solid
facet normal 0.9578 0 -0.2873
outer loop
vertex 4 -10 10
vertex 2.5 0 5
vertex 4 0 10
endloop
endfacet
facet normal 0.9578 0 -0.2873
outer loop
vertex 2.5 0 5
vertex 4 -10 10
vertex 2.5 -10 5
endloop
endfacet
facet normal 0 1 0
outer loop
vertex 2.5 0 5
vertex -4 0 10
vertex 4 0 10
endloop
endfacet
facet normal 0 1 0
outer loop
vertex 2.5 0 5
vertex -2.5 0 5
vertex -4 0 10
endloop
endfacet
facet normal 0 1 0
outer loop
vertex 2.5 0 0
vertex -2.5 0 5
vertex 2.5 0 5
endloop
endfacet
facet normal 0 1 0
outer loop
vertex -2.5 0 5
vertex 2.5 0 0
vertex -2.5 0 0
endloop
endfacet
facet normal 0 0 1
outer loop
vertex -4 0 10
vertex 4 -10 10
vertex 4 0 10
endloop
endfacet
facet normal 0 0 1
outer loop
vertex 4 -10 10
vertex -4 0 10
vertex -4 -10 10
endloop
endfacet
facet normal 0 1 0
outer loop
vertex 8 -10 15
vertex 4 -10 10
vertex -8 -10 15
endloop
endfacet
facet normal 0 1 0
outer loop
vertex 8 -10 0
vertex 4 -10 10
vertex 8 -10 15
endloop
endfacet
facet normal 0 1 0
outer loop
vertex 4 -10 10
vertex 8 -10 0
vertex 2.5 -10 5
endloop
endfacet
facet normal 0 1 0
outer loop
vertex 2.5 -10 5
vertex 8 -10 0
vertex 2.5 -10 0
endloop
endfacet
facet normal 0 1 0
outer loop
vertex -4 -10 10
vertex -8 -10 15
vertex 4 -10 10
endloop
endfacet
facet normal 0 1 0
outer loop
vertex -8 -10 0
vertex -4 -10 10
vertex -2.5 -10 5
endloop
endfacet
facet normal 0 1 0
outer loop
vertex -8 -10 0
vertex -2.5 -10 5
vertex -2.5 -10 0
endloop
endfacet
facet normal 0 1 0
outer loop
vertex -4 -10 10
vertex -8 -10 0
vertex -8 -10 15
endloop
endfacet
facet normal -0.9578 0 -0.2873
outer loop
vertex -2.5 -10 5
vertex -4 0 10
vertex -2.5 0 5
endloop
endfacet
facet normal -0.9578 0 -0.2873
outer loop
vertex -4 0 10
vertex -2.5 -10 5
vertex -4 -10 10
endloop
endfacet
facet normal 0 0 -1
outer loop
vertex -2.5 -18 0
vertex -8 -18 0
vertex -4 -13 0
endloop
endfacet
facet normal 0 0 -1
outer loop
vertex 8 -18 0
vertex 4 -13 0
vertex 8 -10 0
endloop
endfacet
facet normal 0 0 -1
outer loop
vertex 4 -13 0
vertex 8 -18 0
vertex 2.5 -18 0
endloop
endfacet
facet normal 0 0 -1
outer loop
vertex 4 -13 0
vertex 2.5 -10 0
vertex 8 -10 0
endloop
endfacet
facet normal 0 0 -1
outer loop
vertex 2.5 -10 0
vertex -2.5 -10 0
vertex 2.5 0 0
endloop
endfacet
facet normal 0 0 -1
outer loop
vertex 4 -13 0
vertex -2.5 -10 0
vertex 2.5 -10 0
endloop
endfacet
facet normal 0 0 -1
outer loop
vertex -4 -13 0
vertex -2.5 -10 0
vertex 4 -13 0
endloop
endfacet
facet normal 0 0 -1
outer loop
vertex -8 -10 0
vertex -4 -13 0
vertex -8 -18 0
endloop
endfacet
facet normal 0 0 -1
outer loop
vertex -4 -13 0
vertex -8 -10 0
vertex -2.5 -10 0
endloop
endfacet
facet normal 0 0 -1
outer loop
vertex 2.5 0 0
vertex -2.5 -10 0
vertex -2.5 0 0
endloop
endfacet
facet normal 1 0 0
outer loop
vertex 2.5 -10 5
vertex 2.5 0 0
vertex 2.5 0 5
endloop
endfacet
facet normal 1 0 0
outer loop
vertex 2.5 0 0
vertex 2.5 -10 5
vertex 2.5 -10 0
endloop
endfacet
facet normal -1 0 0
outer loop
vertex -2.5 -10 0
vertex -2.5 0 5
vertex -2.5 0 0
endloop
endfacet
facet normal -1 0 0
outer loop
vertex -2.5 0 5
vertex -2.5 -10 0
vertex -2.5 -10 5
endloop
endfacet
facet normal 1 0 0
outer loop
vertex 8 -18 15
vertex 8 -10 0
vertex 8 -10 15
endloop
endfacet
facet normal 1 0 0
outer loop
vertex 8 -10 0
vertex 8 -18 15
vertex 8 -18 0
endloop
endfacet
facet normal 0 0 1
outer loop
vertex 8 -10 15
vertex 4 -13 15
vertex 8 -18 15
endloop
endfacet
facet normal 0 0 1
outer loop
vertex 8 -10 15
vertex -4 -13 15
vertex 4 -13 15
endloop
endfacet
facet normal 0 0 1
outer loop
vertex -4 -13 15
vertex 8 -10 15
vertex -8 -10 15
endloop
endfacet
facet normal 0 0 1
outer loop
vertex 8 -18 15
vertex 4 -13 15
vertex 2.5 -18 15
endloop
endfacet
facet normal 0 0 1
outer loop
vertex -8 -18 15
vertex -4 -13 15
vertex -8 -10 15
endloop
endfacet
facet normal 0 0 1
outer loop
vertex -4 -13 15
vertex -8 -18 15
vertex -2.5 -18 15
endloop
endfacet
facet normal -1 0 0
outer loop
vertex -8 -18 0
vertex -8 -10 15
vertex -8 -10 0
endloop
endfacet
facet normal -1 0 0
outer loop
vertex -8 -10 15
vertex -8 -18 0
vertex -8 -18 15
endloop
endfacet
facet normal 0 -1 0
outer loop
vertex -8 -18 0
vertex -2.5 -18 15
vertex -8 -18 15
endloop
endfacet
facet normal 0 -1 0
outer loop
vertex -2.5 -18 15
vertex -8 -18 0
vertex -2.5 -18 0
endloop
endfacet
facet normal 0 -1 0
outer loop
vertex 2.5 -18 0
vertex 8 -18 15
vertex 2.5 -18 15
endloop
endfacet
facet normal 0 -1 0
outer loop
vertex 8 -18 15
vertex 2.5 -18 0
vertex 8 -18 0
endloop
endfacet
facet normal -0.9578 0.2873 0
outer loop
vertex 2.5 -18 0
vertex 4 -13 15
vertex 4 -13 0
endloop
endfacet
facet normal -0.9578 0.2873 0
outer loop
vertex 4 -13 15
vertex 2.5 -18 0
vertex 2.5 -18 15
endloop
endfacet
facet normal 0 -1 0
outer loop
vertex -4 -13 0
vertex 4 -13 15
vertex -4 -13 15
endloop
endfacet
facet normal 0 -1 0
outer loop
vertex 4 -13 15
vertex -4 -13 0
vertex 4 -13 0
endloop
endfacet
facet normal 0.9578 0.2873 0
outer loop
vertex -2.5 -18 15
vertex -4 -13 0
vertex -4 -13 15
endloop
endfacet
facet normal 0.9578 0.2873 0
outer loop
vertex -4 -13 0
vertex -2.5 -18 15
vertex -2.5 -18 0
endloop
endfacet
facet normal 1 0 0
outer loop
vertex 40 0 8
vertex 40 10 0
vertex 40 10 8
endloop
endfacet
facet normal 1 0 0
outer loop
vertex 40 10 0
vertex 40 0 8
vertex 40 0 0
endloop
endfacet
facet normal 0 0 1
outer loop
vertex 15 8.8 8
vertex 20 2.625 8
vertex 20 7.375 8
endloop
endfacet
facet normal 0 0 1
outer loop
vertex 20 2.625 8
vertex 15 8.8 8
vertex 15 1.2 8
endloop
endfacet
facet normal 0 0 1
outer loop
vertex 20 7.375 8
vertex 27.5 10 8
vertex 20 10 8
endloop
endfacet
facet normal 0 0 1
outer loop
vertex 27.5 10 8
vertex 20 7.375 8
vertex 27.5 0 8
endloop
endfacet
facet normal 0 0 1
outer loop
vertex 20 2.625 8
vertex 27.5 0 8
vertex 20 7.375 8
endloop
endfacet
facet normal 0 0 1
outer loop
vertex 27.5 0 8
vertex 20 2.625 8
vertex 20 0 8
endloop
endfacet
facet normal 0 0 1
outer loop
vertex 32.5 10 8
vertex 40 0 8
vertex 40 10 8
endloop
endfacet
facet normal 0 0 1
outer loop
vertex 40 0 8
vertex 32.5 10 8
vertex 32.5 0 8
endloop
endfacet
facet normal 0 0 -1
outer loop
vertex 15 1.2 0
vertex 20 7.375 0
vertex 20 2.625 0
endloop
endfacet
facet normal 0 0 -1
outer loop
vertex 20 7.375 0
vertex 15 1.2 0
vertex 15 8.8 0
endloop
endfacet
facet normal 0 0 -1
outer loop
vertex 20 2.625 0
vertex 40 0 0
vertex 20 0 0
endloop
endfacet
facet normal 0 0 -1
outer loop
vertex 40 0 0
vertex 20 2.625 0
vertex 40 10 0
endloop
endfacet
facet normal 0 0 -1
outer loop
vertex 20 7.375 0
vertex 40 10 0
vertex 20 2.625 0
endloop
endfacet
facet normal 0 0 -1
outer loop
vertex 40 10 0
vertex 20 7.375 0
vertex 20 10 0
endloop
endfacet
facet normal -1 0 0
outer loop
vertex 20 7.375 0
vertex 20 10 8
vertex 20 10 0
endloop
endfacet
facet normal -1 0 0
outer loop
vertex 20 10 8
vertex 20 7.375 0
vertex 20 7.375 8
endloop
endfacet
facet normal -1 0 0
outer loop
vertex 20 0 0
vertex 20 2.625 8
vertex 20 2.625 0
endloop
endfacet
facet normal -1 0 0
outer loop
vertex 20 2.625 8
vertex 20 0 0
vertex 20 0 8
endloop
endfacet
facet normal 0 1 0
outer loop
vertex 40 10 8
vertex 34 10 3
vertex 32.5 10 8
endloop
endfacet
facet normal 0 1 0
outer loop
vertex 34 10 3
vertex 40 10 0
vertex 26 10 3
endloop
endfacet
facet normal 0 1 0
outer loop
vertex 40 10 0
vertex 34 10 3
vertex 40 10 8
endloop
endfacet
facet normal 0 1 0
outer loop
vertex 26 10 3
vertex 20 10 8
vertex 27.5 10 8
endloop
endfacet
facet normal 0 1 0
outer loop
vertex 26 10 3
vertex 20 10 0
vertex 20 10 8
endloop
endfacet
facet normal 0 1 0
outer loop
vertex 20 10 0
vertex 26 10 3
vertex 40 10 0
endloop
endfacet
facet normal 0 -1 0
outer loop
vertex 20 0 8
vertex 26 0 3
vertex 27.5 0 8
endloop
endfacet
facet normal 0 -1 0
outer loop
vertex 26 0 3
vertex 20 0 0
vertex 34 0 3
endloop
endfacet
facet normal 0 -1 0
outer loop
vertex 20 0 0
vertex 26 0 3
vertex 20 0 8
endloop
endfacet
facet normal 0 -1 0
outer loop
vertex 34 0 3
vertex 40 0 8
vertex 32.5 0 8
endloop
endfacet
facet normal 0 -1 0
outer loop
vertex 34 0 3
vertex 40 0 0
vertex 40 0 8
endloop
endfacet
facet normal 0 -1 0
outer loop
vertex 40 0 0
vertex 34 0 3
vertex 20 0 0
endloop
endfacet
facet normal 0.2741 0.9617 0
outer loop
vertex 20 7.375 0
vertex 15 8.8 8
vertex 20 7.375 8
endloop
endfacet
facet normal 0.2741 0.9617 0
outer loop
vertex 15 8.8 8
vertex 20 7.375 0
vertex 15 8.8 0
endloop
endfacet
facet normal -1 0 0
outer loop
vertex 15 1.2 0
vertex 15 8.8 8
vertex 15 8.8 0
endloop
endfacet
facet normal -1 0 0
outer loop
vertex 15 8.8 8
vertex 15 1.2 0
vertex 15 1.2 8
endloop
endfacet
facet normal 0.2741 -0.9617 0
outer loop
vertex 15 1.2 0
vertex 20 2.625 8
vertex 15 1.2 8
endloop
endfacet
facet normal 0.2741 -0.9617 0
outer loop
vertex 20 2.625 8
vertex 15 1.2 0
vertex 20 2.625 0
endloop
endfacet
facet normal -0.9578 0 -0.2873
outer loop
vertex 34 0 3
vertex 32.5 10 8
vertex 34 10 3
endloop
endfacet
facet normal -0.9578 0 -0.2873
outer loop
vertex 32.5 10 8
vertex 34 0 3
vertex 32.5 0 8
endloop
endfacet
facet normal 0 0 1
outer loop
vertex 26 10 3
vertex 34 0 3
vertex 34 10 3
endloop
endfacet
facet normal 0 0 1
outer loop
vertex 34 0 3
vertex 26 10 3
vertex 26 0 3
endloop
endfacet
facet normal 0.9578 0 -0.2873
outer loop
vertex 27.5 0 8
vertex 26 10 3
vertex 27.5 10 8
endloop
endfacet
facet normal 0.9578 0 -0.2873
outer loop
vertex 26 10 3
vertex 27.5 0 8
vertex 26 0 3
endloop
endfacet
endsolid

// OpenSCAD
// file: include.scad
include <globals.scad>;

//////////////////      END SECTION       //////////////////

	module added_pins(){
		difference(){
			union(){
				translate([30/(15/4),obj_leg*leg_length,30/(15/4)]) pin();
				translate([30/(15/4)+14.5,obj_leg*leg_length,30/(15/4)+14]) pin();
			}
			union(){
							translate([30/(15/4)+13.5,obj_leg*leg_length-20,30/(15/4)+5])cube(size=[2,40,15]);
							translate([30/(15/4)+7.5,obj_leg*leg_length-20,30/(15/4)+15])rotate([0,90,0]) cube(size=[2,40,15]);	

							translate([30/(15/4)-1,obj_leg*leg_length-20,30/(15/4)-8])cube(size=[2,40,15]);
							translate([30/(15/4)-10,obj_leg*leg_length-20,30/(15/4)+1])rotate([0,90,0]) cube(size=[2,40,15]);
			}
		}
	}
	module taken_pins() {
		translate([30/(15/4)+14,obj_leg*leg_length-10,30/(15/4)]) mirror_pin();
		translate([30/(15/4),obj_leg*leg_length-10,30/(15/4)+15]) mirror_pin();
	}


//////////////////      OTHER STUFF       //////////////////

	module holes() {
		rotate([0,0,90]) for(y=[0:other_holes])
		translate([obj_leg+y*15,-15.5,7.5]) union() {
			translate([7.5,0,15]) hole_up();
			hole_down();
		}
	}
	module extend_holes() {
	module top(){
		rotate([0,0,90]) for(y=[0:other_holes+1])
		translate([(30/4)+y*15,-15.5,7.5]) union() {
			translate([7.5,0,15]) hole_up();
		}
	}
	module bottom(){
		rotate([0,0,90]) for(y=[0:other_holes+2])
		translate([(30/4)+y*15,-15.5,7.5]) union() {
			hole_down();
		
}
	}
	union(){
		top();
		bottom();
	}
	}

	module hole() {
		union() {
			rotate([90, 90, 0]) cylinder(h=40, d=hole_pin_diameter, center=true);
			translate([0,7.5,0]) sphere(d=hole_ball_size);
			translate([0,-6,0]) sphere(d=hole_ball_size);
		}
	}
	module hole_up() {
		union() {
			rotate([90, 90, 0]) cylinder(h=40, d=hole_pin_diameter, center=true);
			translate([0,7.5,10]) cylinder(h=hole_pin_height, d=hole_pin_diameter, center=true);
			translate([0,-6,10]) cylinder(h=hole_pin_height, d=hole_pin_diameter, center=true);
			translate([0,7.5,0]) sphere(d=hole_ball_size);
			translate([0,-6,0]) sphere(d=hole_ball_size);
		}
	}
	module hole_down() {
		union() {
			rotate([90, 90, 0]) cylinder(h=40, d=hole_pin_diameter, center=true);
			translate([0,7.5,-10]) cylinder(h=hole_pin_height, d=hole_pin_diameter, center=true);
			translate([0,-6,-10]) cylinder(h=hole_pin_height, d=hole_pin_diameter, center=true);
			translate([0,7.5,0]) sphere(d=hole_ball_size);
			translate([0,-6,0]) sphere(d=hole_ball_size);
		}
	}
	module pin() {
		union() {
			rotate([90, 90, 0]) cylinder(h=pin_height, d=pin_diameter, center=true);
			translate([0,7.5,0]) sphere(d=ball_size);
		}
	}

	module mirror_pin() {
		rotate([90, 90, 0]) cylinder(h=hole_pin_height+small_number, d=hole_pin_diameter, center=true);
		translate([0,-(pin_height-(ball_size/2)),0]) sphere(d=ball_size);
	}


//////////////////      SOME RACK AND Z THINGS       //////////////////

module z_holes() {
    rotate([0,-90,0]) for(z=[0:z_hole_number])
    translate([22.5+z*15,16,-12])
        hole();
}

module pin_cuts() {
	union(){
		cube(size=[2,10,40], center=true);
		rotate([0,0,90]) cube(size=[2,10,40], center=true);
	}
}
module pin_uncut() {
	union(){
		rotate([0, 0, 90]) cylinder(h=hole_pin_height, d=hole_pin_diameter, center=true);
		translate([0,0,10]) sphere(d=ball_hole);
	}
}


module pin_out() {
	union(){
		rotate([0, 0, 90]) cylinder(h=pin_height, d=pin_diameter, center=true);
		translate([0,0,10]) sphere(d= ball_size);
	}
}


module pins_z(){
	difference() {
		pin_out();
		pin_cuts();
	}
}
//////////////////      RACK AND SLIDE     ///////////////////

module straight_pins() {
	for(z=[0:((((obj_leg*leg_length)*2)-(obj_leg*2))/3)/14.5]) rotate([-90,0,0]) translate([z*15,30/(15/4),14]) pins_z();
	for(z=[0:((((obj_leg*leg_length)*2)-(obj_leg*2))/3)/14.5]) rotate([-90,0,0]) translate([z*15,30/(15/4)-14,14]) pins_z();
}
module stagger_pins() {
	for(z=[0:((((obj_leg*leg_length)*2)-(obj_leg*2))/3)/14.5]) rotate([-90,0,0]) translate([z*15,30/(15/4),14]) pins_z();
	for(z=[0:((((obj_leg*leg_length)*2)-(obj_leg*2))/3)/14.5]) rotate([-90,0,0]) translate([z*15+7,30/(15/4)-14,14]) pins_z();
}


//////////////////      DOVE TAIL       //////////////////

module male_dovetail(height) {
	dovetail_3d(max_width,min_width,depth,height);
}

module dovetail_3d(max_width=11, min_width=5, depth=5, height=30) {
	linear_extrude(height=height, convexity=2)
		dovetail_2d(max_width,min_width,depth);
}

module dovetail_2d(max_width=11, min_width=5, depth=5) {
	angle=atan((max_width/2-min_width/2)/depth);
	//echo("angle: ", angle);
	polygon(paths=[[0,1,2,3,0]], points=[[-min_width/2,0], [-max_width/2,depth], [max_width/2, depth], [min_width/2,0]]);
}

//bow tie
	module tie_end(height){
				rotate([0,0,0]) translate([0,-0.01,((obj_leg/2)/2)]) male_dovetail(height);
				rotate([0,90,0]) translate([0,-0.01,((obj_leg/2)/2)]) male_dovetail(height);
				rotate([0,180,0]) translate([0,-0.01,((obj_leg/2)/2)]) male_dovetail(height);
				rotate([0,-90,0]) translate([0,-0.01,((obj_leg/2)/2)]) male_dovetail(height);
	}

module bow_support(){
	difference(){
		intersection(){
			translate([-15,0,-15]) cube([30,9,30]);
			scale([1.05,1.05,1.05]) rotate([0,45,0]) tie_end();
		}
		cube([29.2,29.2,29.2], center=true);
	}
}

	module wrap(units){
	for (y = [-1:units-2]) // two iterations, z = -1, z = 1
	{
			translate([15, (y*30)+15, 15]){
			for (r = [0:4]) // two iterations, z = -1, z = 1
			{
				rotate([0,r*90,0]) translate([0,15,15]) rotate([-90,0,0])male_dovetail(height=30);
			}
		}
	}
	}


module nut(h=2.4) {
    hull() {
        cylinder(d = 6.5, h=h, $fn=6);
        translate([0,0,2.4]) cylinder(d = 3.2, h=1.2, $fn=20);
    }
}

module elongated_nut() {
    hull() {
        translate([-2,0,0]) nut();
        translate([2,0,0]) nut();
    }
}

module motor_shaft_hole(h=10) {
    difference() {
        cylinder(d=motor_shaft_hole_dia, h=h);
        translate([0,4.5,h/2]) cube([5,5,h], center=true); 
    }
}

module motor_plate(h=5) {
    difference () {
        translate([0,0,h/2]) cube([motor_side_length,motor_side_length,h], center=true);
            
        translate([0,0,-.5]) cylinder(d=motor_center_hole, h=h+1);

        translate([motor_bolt_hole_distance/2,motor_bolt_hole_distance/2,0]) cylinder(d=bolt_hole_dia, h=h+1, $fn=20);
        translate([-motor_bolt_hole_distance/2,motor_bolt_hole_distance/2,0]) cylinder(d=bolt_hole_dia, h=h+1, $fn=20);
        translate([motor_bolt_hole_distance/2,-motor_bolt_hole_distance/2,0]) cylinder(d=bolt_hole_dia, h=h+1, $fn=20);
        translate([-motor_bolt_hole_distance/2,-motor_bolt_hole_distance/2,0]) cylinder(d=bolt_hole_dia, h=h+1, $fn=20);
    }
}

//translate([50,50]) nut();
//translate([50,50]) elongated_nut();
//translate([50,47.2]) cube([5.6, 5.6, 2.4]);
// file: globals.scad
/*
Most things in this file is represented as one millimeter, so keep that in mind while changing things.
Some of the setting are not mm but at variables that you can set, such as 2*x=2x and you are setting what x is.
I will try to specify when things are variables and not exact measurements.
*/

// printer slop
slop = 0.15;

obj_leg = 30;
leg_length = 5.5;
small_number = 0.001;
metal_core_rode_global = 5;


///////////////// number of holes /////////////////////
z_hole_number = 8;
other_holes = 8;

///////////////// Pins /////////////////////

//pins that poke out
ball_size = 10;
pin_height = 20;
pin_diameter = 6;


//holes
hole_ball_size = ball_size;
hole_pin_height = pin_height;
hole_pin_diameter = pin_diameter;

///////////////// Z THINGS /////////////////////

berring_slot_width = 7.5;
berring_slot_depth = 6.5;
metal_core_rode = 5;

///////////////// X THINGS /////////////////////

//male dove tails
max_width=8;
min_width=5;
depth=5;
height=obj_leg/2;

//female dove tails, this is found on the y mounts
girl_max_width=11;
girl_min_width=5;
girl_depth=5;
girl_height=obj_leg;


///////////////// Y THINGS /////////////////////
/*
The Y is so normal that all of those global variables at the top should change all of the setting in it, this section is set her incase there are variables set in the future development of this project.
*/

// stepper
motor_side_length = 43.2;
motor_bolt_hole_distance = 31;
motor_center_hole = 23;
motor_shaft_dia = 5;
motor_shaft_hole_dia = 5+2*slop;

// bolts etc.
bolt_hole_dia = 3.2;
bolt_head_hole_dia = 5.8;


// threaded rod
lifter_rod_diam = 9.86;
hole_threaded_rod = lifter_rod_diam+2*slop;
// main file
include <globals.scad>;
include <include.scad>;

height = 10;

// ver 1
difference() {
    union() {
        translate([0,0,5]) rotate([90,0,0]) male_dovetail(height=10);
        translate([-4.5, -14, 0]) cube([9,4,10]);
        translate([-2.5, -12, 0]) cube([5,12,5]);
        translate([-1.5, -height, 0]) cube([3,height,10]);
        translate([-8, -height-8, 0]) cube([16,8,15]);
    }
    translate([0, -height-8, 0]) male_dovetail(height=15);
}

// ver 2

difference() {
    union() {
        translate([20,0,0]) cube([20,10,8]);
        translate([20,5,0]) rotate([0,0,90]) scale([0.95,1,1]) male_dovetail(height=8);
    }
    translate([30,0,8]) rotate([-90,0,0]) male_dovetail(height=15);
}
